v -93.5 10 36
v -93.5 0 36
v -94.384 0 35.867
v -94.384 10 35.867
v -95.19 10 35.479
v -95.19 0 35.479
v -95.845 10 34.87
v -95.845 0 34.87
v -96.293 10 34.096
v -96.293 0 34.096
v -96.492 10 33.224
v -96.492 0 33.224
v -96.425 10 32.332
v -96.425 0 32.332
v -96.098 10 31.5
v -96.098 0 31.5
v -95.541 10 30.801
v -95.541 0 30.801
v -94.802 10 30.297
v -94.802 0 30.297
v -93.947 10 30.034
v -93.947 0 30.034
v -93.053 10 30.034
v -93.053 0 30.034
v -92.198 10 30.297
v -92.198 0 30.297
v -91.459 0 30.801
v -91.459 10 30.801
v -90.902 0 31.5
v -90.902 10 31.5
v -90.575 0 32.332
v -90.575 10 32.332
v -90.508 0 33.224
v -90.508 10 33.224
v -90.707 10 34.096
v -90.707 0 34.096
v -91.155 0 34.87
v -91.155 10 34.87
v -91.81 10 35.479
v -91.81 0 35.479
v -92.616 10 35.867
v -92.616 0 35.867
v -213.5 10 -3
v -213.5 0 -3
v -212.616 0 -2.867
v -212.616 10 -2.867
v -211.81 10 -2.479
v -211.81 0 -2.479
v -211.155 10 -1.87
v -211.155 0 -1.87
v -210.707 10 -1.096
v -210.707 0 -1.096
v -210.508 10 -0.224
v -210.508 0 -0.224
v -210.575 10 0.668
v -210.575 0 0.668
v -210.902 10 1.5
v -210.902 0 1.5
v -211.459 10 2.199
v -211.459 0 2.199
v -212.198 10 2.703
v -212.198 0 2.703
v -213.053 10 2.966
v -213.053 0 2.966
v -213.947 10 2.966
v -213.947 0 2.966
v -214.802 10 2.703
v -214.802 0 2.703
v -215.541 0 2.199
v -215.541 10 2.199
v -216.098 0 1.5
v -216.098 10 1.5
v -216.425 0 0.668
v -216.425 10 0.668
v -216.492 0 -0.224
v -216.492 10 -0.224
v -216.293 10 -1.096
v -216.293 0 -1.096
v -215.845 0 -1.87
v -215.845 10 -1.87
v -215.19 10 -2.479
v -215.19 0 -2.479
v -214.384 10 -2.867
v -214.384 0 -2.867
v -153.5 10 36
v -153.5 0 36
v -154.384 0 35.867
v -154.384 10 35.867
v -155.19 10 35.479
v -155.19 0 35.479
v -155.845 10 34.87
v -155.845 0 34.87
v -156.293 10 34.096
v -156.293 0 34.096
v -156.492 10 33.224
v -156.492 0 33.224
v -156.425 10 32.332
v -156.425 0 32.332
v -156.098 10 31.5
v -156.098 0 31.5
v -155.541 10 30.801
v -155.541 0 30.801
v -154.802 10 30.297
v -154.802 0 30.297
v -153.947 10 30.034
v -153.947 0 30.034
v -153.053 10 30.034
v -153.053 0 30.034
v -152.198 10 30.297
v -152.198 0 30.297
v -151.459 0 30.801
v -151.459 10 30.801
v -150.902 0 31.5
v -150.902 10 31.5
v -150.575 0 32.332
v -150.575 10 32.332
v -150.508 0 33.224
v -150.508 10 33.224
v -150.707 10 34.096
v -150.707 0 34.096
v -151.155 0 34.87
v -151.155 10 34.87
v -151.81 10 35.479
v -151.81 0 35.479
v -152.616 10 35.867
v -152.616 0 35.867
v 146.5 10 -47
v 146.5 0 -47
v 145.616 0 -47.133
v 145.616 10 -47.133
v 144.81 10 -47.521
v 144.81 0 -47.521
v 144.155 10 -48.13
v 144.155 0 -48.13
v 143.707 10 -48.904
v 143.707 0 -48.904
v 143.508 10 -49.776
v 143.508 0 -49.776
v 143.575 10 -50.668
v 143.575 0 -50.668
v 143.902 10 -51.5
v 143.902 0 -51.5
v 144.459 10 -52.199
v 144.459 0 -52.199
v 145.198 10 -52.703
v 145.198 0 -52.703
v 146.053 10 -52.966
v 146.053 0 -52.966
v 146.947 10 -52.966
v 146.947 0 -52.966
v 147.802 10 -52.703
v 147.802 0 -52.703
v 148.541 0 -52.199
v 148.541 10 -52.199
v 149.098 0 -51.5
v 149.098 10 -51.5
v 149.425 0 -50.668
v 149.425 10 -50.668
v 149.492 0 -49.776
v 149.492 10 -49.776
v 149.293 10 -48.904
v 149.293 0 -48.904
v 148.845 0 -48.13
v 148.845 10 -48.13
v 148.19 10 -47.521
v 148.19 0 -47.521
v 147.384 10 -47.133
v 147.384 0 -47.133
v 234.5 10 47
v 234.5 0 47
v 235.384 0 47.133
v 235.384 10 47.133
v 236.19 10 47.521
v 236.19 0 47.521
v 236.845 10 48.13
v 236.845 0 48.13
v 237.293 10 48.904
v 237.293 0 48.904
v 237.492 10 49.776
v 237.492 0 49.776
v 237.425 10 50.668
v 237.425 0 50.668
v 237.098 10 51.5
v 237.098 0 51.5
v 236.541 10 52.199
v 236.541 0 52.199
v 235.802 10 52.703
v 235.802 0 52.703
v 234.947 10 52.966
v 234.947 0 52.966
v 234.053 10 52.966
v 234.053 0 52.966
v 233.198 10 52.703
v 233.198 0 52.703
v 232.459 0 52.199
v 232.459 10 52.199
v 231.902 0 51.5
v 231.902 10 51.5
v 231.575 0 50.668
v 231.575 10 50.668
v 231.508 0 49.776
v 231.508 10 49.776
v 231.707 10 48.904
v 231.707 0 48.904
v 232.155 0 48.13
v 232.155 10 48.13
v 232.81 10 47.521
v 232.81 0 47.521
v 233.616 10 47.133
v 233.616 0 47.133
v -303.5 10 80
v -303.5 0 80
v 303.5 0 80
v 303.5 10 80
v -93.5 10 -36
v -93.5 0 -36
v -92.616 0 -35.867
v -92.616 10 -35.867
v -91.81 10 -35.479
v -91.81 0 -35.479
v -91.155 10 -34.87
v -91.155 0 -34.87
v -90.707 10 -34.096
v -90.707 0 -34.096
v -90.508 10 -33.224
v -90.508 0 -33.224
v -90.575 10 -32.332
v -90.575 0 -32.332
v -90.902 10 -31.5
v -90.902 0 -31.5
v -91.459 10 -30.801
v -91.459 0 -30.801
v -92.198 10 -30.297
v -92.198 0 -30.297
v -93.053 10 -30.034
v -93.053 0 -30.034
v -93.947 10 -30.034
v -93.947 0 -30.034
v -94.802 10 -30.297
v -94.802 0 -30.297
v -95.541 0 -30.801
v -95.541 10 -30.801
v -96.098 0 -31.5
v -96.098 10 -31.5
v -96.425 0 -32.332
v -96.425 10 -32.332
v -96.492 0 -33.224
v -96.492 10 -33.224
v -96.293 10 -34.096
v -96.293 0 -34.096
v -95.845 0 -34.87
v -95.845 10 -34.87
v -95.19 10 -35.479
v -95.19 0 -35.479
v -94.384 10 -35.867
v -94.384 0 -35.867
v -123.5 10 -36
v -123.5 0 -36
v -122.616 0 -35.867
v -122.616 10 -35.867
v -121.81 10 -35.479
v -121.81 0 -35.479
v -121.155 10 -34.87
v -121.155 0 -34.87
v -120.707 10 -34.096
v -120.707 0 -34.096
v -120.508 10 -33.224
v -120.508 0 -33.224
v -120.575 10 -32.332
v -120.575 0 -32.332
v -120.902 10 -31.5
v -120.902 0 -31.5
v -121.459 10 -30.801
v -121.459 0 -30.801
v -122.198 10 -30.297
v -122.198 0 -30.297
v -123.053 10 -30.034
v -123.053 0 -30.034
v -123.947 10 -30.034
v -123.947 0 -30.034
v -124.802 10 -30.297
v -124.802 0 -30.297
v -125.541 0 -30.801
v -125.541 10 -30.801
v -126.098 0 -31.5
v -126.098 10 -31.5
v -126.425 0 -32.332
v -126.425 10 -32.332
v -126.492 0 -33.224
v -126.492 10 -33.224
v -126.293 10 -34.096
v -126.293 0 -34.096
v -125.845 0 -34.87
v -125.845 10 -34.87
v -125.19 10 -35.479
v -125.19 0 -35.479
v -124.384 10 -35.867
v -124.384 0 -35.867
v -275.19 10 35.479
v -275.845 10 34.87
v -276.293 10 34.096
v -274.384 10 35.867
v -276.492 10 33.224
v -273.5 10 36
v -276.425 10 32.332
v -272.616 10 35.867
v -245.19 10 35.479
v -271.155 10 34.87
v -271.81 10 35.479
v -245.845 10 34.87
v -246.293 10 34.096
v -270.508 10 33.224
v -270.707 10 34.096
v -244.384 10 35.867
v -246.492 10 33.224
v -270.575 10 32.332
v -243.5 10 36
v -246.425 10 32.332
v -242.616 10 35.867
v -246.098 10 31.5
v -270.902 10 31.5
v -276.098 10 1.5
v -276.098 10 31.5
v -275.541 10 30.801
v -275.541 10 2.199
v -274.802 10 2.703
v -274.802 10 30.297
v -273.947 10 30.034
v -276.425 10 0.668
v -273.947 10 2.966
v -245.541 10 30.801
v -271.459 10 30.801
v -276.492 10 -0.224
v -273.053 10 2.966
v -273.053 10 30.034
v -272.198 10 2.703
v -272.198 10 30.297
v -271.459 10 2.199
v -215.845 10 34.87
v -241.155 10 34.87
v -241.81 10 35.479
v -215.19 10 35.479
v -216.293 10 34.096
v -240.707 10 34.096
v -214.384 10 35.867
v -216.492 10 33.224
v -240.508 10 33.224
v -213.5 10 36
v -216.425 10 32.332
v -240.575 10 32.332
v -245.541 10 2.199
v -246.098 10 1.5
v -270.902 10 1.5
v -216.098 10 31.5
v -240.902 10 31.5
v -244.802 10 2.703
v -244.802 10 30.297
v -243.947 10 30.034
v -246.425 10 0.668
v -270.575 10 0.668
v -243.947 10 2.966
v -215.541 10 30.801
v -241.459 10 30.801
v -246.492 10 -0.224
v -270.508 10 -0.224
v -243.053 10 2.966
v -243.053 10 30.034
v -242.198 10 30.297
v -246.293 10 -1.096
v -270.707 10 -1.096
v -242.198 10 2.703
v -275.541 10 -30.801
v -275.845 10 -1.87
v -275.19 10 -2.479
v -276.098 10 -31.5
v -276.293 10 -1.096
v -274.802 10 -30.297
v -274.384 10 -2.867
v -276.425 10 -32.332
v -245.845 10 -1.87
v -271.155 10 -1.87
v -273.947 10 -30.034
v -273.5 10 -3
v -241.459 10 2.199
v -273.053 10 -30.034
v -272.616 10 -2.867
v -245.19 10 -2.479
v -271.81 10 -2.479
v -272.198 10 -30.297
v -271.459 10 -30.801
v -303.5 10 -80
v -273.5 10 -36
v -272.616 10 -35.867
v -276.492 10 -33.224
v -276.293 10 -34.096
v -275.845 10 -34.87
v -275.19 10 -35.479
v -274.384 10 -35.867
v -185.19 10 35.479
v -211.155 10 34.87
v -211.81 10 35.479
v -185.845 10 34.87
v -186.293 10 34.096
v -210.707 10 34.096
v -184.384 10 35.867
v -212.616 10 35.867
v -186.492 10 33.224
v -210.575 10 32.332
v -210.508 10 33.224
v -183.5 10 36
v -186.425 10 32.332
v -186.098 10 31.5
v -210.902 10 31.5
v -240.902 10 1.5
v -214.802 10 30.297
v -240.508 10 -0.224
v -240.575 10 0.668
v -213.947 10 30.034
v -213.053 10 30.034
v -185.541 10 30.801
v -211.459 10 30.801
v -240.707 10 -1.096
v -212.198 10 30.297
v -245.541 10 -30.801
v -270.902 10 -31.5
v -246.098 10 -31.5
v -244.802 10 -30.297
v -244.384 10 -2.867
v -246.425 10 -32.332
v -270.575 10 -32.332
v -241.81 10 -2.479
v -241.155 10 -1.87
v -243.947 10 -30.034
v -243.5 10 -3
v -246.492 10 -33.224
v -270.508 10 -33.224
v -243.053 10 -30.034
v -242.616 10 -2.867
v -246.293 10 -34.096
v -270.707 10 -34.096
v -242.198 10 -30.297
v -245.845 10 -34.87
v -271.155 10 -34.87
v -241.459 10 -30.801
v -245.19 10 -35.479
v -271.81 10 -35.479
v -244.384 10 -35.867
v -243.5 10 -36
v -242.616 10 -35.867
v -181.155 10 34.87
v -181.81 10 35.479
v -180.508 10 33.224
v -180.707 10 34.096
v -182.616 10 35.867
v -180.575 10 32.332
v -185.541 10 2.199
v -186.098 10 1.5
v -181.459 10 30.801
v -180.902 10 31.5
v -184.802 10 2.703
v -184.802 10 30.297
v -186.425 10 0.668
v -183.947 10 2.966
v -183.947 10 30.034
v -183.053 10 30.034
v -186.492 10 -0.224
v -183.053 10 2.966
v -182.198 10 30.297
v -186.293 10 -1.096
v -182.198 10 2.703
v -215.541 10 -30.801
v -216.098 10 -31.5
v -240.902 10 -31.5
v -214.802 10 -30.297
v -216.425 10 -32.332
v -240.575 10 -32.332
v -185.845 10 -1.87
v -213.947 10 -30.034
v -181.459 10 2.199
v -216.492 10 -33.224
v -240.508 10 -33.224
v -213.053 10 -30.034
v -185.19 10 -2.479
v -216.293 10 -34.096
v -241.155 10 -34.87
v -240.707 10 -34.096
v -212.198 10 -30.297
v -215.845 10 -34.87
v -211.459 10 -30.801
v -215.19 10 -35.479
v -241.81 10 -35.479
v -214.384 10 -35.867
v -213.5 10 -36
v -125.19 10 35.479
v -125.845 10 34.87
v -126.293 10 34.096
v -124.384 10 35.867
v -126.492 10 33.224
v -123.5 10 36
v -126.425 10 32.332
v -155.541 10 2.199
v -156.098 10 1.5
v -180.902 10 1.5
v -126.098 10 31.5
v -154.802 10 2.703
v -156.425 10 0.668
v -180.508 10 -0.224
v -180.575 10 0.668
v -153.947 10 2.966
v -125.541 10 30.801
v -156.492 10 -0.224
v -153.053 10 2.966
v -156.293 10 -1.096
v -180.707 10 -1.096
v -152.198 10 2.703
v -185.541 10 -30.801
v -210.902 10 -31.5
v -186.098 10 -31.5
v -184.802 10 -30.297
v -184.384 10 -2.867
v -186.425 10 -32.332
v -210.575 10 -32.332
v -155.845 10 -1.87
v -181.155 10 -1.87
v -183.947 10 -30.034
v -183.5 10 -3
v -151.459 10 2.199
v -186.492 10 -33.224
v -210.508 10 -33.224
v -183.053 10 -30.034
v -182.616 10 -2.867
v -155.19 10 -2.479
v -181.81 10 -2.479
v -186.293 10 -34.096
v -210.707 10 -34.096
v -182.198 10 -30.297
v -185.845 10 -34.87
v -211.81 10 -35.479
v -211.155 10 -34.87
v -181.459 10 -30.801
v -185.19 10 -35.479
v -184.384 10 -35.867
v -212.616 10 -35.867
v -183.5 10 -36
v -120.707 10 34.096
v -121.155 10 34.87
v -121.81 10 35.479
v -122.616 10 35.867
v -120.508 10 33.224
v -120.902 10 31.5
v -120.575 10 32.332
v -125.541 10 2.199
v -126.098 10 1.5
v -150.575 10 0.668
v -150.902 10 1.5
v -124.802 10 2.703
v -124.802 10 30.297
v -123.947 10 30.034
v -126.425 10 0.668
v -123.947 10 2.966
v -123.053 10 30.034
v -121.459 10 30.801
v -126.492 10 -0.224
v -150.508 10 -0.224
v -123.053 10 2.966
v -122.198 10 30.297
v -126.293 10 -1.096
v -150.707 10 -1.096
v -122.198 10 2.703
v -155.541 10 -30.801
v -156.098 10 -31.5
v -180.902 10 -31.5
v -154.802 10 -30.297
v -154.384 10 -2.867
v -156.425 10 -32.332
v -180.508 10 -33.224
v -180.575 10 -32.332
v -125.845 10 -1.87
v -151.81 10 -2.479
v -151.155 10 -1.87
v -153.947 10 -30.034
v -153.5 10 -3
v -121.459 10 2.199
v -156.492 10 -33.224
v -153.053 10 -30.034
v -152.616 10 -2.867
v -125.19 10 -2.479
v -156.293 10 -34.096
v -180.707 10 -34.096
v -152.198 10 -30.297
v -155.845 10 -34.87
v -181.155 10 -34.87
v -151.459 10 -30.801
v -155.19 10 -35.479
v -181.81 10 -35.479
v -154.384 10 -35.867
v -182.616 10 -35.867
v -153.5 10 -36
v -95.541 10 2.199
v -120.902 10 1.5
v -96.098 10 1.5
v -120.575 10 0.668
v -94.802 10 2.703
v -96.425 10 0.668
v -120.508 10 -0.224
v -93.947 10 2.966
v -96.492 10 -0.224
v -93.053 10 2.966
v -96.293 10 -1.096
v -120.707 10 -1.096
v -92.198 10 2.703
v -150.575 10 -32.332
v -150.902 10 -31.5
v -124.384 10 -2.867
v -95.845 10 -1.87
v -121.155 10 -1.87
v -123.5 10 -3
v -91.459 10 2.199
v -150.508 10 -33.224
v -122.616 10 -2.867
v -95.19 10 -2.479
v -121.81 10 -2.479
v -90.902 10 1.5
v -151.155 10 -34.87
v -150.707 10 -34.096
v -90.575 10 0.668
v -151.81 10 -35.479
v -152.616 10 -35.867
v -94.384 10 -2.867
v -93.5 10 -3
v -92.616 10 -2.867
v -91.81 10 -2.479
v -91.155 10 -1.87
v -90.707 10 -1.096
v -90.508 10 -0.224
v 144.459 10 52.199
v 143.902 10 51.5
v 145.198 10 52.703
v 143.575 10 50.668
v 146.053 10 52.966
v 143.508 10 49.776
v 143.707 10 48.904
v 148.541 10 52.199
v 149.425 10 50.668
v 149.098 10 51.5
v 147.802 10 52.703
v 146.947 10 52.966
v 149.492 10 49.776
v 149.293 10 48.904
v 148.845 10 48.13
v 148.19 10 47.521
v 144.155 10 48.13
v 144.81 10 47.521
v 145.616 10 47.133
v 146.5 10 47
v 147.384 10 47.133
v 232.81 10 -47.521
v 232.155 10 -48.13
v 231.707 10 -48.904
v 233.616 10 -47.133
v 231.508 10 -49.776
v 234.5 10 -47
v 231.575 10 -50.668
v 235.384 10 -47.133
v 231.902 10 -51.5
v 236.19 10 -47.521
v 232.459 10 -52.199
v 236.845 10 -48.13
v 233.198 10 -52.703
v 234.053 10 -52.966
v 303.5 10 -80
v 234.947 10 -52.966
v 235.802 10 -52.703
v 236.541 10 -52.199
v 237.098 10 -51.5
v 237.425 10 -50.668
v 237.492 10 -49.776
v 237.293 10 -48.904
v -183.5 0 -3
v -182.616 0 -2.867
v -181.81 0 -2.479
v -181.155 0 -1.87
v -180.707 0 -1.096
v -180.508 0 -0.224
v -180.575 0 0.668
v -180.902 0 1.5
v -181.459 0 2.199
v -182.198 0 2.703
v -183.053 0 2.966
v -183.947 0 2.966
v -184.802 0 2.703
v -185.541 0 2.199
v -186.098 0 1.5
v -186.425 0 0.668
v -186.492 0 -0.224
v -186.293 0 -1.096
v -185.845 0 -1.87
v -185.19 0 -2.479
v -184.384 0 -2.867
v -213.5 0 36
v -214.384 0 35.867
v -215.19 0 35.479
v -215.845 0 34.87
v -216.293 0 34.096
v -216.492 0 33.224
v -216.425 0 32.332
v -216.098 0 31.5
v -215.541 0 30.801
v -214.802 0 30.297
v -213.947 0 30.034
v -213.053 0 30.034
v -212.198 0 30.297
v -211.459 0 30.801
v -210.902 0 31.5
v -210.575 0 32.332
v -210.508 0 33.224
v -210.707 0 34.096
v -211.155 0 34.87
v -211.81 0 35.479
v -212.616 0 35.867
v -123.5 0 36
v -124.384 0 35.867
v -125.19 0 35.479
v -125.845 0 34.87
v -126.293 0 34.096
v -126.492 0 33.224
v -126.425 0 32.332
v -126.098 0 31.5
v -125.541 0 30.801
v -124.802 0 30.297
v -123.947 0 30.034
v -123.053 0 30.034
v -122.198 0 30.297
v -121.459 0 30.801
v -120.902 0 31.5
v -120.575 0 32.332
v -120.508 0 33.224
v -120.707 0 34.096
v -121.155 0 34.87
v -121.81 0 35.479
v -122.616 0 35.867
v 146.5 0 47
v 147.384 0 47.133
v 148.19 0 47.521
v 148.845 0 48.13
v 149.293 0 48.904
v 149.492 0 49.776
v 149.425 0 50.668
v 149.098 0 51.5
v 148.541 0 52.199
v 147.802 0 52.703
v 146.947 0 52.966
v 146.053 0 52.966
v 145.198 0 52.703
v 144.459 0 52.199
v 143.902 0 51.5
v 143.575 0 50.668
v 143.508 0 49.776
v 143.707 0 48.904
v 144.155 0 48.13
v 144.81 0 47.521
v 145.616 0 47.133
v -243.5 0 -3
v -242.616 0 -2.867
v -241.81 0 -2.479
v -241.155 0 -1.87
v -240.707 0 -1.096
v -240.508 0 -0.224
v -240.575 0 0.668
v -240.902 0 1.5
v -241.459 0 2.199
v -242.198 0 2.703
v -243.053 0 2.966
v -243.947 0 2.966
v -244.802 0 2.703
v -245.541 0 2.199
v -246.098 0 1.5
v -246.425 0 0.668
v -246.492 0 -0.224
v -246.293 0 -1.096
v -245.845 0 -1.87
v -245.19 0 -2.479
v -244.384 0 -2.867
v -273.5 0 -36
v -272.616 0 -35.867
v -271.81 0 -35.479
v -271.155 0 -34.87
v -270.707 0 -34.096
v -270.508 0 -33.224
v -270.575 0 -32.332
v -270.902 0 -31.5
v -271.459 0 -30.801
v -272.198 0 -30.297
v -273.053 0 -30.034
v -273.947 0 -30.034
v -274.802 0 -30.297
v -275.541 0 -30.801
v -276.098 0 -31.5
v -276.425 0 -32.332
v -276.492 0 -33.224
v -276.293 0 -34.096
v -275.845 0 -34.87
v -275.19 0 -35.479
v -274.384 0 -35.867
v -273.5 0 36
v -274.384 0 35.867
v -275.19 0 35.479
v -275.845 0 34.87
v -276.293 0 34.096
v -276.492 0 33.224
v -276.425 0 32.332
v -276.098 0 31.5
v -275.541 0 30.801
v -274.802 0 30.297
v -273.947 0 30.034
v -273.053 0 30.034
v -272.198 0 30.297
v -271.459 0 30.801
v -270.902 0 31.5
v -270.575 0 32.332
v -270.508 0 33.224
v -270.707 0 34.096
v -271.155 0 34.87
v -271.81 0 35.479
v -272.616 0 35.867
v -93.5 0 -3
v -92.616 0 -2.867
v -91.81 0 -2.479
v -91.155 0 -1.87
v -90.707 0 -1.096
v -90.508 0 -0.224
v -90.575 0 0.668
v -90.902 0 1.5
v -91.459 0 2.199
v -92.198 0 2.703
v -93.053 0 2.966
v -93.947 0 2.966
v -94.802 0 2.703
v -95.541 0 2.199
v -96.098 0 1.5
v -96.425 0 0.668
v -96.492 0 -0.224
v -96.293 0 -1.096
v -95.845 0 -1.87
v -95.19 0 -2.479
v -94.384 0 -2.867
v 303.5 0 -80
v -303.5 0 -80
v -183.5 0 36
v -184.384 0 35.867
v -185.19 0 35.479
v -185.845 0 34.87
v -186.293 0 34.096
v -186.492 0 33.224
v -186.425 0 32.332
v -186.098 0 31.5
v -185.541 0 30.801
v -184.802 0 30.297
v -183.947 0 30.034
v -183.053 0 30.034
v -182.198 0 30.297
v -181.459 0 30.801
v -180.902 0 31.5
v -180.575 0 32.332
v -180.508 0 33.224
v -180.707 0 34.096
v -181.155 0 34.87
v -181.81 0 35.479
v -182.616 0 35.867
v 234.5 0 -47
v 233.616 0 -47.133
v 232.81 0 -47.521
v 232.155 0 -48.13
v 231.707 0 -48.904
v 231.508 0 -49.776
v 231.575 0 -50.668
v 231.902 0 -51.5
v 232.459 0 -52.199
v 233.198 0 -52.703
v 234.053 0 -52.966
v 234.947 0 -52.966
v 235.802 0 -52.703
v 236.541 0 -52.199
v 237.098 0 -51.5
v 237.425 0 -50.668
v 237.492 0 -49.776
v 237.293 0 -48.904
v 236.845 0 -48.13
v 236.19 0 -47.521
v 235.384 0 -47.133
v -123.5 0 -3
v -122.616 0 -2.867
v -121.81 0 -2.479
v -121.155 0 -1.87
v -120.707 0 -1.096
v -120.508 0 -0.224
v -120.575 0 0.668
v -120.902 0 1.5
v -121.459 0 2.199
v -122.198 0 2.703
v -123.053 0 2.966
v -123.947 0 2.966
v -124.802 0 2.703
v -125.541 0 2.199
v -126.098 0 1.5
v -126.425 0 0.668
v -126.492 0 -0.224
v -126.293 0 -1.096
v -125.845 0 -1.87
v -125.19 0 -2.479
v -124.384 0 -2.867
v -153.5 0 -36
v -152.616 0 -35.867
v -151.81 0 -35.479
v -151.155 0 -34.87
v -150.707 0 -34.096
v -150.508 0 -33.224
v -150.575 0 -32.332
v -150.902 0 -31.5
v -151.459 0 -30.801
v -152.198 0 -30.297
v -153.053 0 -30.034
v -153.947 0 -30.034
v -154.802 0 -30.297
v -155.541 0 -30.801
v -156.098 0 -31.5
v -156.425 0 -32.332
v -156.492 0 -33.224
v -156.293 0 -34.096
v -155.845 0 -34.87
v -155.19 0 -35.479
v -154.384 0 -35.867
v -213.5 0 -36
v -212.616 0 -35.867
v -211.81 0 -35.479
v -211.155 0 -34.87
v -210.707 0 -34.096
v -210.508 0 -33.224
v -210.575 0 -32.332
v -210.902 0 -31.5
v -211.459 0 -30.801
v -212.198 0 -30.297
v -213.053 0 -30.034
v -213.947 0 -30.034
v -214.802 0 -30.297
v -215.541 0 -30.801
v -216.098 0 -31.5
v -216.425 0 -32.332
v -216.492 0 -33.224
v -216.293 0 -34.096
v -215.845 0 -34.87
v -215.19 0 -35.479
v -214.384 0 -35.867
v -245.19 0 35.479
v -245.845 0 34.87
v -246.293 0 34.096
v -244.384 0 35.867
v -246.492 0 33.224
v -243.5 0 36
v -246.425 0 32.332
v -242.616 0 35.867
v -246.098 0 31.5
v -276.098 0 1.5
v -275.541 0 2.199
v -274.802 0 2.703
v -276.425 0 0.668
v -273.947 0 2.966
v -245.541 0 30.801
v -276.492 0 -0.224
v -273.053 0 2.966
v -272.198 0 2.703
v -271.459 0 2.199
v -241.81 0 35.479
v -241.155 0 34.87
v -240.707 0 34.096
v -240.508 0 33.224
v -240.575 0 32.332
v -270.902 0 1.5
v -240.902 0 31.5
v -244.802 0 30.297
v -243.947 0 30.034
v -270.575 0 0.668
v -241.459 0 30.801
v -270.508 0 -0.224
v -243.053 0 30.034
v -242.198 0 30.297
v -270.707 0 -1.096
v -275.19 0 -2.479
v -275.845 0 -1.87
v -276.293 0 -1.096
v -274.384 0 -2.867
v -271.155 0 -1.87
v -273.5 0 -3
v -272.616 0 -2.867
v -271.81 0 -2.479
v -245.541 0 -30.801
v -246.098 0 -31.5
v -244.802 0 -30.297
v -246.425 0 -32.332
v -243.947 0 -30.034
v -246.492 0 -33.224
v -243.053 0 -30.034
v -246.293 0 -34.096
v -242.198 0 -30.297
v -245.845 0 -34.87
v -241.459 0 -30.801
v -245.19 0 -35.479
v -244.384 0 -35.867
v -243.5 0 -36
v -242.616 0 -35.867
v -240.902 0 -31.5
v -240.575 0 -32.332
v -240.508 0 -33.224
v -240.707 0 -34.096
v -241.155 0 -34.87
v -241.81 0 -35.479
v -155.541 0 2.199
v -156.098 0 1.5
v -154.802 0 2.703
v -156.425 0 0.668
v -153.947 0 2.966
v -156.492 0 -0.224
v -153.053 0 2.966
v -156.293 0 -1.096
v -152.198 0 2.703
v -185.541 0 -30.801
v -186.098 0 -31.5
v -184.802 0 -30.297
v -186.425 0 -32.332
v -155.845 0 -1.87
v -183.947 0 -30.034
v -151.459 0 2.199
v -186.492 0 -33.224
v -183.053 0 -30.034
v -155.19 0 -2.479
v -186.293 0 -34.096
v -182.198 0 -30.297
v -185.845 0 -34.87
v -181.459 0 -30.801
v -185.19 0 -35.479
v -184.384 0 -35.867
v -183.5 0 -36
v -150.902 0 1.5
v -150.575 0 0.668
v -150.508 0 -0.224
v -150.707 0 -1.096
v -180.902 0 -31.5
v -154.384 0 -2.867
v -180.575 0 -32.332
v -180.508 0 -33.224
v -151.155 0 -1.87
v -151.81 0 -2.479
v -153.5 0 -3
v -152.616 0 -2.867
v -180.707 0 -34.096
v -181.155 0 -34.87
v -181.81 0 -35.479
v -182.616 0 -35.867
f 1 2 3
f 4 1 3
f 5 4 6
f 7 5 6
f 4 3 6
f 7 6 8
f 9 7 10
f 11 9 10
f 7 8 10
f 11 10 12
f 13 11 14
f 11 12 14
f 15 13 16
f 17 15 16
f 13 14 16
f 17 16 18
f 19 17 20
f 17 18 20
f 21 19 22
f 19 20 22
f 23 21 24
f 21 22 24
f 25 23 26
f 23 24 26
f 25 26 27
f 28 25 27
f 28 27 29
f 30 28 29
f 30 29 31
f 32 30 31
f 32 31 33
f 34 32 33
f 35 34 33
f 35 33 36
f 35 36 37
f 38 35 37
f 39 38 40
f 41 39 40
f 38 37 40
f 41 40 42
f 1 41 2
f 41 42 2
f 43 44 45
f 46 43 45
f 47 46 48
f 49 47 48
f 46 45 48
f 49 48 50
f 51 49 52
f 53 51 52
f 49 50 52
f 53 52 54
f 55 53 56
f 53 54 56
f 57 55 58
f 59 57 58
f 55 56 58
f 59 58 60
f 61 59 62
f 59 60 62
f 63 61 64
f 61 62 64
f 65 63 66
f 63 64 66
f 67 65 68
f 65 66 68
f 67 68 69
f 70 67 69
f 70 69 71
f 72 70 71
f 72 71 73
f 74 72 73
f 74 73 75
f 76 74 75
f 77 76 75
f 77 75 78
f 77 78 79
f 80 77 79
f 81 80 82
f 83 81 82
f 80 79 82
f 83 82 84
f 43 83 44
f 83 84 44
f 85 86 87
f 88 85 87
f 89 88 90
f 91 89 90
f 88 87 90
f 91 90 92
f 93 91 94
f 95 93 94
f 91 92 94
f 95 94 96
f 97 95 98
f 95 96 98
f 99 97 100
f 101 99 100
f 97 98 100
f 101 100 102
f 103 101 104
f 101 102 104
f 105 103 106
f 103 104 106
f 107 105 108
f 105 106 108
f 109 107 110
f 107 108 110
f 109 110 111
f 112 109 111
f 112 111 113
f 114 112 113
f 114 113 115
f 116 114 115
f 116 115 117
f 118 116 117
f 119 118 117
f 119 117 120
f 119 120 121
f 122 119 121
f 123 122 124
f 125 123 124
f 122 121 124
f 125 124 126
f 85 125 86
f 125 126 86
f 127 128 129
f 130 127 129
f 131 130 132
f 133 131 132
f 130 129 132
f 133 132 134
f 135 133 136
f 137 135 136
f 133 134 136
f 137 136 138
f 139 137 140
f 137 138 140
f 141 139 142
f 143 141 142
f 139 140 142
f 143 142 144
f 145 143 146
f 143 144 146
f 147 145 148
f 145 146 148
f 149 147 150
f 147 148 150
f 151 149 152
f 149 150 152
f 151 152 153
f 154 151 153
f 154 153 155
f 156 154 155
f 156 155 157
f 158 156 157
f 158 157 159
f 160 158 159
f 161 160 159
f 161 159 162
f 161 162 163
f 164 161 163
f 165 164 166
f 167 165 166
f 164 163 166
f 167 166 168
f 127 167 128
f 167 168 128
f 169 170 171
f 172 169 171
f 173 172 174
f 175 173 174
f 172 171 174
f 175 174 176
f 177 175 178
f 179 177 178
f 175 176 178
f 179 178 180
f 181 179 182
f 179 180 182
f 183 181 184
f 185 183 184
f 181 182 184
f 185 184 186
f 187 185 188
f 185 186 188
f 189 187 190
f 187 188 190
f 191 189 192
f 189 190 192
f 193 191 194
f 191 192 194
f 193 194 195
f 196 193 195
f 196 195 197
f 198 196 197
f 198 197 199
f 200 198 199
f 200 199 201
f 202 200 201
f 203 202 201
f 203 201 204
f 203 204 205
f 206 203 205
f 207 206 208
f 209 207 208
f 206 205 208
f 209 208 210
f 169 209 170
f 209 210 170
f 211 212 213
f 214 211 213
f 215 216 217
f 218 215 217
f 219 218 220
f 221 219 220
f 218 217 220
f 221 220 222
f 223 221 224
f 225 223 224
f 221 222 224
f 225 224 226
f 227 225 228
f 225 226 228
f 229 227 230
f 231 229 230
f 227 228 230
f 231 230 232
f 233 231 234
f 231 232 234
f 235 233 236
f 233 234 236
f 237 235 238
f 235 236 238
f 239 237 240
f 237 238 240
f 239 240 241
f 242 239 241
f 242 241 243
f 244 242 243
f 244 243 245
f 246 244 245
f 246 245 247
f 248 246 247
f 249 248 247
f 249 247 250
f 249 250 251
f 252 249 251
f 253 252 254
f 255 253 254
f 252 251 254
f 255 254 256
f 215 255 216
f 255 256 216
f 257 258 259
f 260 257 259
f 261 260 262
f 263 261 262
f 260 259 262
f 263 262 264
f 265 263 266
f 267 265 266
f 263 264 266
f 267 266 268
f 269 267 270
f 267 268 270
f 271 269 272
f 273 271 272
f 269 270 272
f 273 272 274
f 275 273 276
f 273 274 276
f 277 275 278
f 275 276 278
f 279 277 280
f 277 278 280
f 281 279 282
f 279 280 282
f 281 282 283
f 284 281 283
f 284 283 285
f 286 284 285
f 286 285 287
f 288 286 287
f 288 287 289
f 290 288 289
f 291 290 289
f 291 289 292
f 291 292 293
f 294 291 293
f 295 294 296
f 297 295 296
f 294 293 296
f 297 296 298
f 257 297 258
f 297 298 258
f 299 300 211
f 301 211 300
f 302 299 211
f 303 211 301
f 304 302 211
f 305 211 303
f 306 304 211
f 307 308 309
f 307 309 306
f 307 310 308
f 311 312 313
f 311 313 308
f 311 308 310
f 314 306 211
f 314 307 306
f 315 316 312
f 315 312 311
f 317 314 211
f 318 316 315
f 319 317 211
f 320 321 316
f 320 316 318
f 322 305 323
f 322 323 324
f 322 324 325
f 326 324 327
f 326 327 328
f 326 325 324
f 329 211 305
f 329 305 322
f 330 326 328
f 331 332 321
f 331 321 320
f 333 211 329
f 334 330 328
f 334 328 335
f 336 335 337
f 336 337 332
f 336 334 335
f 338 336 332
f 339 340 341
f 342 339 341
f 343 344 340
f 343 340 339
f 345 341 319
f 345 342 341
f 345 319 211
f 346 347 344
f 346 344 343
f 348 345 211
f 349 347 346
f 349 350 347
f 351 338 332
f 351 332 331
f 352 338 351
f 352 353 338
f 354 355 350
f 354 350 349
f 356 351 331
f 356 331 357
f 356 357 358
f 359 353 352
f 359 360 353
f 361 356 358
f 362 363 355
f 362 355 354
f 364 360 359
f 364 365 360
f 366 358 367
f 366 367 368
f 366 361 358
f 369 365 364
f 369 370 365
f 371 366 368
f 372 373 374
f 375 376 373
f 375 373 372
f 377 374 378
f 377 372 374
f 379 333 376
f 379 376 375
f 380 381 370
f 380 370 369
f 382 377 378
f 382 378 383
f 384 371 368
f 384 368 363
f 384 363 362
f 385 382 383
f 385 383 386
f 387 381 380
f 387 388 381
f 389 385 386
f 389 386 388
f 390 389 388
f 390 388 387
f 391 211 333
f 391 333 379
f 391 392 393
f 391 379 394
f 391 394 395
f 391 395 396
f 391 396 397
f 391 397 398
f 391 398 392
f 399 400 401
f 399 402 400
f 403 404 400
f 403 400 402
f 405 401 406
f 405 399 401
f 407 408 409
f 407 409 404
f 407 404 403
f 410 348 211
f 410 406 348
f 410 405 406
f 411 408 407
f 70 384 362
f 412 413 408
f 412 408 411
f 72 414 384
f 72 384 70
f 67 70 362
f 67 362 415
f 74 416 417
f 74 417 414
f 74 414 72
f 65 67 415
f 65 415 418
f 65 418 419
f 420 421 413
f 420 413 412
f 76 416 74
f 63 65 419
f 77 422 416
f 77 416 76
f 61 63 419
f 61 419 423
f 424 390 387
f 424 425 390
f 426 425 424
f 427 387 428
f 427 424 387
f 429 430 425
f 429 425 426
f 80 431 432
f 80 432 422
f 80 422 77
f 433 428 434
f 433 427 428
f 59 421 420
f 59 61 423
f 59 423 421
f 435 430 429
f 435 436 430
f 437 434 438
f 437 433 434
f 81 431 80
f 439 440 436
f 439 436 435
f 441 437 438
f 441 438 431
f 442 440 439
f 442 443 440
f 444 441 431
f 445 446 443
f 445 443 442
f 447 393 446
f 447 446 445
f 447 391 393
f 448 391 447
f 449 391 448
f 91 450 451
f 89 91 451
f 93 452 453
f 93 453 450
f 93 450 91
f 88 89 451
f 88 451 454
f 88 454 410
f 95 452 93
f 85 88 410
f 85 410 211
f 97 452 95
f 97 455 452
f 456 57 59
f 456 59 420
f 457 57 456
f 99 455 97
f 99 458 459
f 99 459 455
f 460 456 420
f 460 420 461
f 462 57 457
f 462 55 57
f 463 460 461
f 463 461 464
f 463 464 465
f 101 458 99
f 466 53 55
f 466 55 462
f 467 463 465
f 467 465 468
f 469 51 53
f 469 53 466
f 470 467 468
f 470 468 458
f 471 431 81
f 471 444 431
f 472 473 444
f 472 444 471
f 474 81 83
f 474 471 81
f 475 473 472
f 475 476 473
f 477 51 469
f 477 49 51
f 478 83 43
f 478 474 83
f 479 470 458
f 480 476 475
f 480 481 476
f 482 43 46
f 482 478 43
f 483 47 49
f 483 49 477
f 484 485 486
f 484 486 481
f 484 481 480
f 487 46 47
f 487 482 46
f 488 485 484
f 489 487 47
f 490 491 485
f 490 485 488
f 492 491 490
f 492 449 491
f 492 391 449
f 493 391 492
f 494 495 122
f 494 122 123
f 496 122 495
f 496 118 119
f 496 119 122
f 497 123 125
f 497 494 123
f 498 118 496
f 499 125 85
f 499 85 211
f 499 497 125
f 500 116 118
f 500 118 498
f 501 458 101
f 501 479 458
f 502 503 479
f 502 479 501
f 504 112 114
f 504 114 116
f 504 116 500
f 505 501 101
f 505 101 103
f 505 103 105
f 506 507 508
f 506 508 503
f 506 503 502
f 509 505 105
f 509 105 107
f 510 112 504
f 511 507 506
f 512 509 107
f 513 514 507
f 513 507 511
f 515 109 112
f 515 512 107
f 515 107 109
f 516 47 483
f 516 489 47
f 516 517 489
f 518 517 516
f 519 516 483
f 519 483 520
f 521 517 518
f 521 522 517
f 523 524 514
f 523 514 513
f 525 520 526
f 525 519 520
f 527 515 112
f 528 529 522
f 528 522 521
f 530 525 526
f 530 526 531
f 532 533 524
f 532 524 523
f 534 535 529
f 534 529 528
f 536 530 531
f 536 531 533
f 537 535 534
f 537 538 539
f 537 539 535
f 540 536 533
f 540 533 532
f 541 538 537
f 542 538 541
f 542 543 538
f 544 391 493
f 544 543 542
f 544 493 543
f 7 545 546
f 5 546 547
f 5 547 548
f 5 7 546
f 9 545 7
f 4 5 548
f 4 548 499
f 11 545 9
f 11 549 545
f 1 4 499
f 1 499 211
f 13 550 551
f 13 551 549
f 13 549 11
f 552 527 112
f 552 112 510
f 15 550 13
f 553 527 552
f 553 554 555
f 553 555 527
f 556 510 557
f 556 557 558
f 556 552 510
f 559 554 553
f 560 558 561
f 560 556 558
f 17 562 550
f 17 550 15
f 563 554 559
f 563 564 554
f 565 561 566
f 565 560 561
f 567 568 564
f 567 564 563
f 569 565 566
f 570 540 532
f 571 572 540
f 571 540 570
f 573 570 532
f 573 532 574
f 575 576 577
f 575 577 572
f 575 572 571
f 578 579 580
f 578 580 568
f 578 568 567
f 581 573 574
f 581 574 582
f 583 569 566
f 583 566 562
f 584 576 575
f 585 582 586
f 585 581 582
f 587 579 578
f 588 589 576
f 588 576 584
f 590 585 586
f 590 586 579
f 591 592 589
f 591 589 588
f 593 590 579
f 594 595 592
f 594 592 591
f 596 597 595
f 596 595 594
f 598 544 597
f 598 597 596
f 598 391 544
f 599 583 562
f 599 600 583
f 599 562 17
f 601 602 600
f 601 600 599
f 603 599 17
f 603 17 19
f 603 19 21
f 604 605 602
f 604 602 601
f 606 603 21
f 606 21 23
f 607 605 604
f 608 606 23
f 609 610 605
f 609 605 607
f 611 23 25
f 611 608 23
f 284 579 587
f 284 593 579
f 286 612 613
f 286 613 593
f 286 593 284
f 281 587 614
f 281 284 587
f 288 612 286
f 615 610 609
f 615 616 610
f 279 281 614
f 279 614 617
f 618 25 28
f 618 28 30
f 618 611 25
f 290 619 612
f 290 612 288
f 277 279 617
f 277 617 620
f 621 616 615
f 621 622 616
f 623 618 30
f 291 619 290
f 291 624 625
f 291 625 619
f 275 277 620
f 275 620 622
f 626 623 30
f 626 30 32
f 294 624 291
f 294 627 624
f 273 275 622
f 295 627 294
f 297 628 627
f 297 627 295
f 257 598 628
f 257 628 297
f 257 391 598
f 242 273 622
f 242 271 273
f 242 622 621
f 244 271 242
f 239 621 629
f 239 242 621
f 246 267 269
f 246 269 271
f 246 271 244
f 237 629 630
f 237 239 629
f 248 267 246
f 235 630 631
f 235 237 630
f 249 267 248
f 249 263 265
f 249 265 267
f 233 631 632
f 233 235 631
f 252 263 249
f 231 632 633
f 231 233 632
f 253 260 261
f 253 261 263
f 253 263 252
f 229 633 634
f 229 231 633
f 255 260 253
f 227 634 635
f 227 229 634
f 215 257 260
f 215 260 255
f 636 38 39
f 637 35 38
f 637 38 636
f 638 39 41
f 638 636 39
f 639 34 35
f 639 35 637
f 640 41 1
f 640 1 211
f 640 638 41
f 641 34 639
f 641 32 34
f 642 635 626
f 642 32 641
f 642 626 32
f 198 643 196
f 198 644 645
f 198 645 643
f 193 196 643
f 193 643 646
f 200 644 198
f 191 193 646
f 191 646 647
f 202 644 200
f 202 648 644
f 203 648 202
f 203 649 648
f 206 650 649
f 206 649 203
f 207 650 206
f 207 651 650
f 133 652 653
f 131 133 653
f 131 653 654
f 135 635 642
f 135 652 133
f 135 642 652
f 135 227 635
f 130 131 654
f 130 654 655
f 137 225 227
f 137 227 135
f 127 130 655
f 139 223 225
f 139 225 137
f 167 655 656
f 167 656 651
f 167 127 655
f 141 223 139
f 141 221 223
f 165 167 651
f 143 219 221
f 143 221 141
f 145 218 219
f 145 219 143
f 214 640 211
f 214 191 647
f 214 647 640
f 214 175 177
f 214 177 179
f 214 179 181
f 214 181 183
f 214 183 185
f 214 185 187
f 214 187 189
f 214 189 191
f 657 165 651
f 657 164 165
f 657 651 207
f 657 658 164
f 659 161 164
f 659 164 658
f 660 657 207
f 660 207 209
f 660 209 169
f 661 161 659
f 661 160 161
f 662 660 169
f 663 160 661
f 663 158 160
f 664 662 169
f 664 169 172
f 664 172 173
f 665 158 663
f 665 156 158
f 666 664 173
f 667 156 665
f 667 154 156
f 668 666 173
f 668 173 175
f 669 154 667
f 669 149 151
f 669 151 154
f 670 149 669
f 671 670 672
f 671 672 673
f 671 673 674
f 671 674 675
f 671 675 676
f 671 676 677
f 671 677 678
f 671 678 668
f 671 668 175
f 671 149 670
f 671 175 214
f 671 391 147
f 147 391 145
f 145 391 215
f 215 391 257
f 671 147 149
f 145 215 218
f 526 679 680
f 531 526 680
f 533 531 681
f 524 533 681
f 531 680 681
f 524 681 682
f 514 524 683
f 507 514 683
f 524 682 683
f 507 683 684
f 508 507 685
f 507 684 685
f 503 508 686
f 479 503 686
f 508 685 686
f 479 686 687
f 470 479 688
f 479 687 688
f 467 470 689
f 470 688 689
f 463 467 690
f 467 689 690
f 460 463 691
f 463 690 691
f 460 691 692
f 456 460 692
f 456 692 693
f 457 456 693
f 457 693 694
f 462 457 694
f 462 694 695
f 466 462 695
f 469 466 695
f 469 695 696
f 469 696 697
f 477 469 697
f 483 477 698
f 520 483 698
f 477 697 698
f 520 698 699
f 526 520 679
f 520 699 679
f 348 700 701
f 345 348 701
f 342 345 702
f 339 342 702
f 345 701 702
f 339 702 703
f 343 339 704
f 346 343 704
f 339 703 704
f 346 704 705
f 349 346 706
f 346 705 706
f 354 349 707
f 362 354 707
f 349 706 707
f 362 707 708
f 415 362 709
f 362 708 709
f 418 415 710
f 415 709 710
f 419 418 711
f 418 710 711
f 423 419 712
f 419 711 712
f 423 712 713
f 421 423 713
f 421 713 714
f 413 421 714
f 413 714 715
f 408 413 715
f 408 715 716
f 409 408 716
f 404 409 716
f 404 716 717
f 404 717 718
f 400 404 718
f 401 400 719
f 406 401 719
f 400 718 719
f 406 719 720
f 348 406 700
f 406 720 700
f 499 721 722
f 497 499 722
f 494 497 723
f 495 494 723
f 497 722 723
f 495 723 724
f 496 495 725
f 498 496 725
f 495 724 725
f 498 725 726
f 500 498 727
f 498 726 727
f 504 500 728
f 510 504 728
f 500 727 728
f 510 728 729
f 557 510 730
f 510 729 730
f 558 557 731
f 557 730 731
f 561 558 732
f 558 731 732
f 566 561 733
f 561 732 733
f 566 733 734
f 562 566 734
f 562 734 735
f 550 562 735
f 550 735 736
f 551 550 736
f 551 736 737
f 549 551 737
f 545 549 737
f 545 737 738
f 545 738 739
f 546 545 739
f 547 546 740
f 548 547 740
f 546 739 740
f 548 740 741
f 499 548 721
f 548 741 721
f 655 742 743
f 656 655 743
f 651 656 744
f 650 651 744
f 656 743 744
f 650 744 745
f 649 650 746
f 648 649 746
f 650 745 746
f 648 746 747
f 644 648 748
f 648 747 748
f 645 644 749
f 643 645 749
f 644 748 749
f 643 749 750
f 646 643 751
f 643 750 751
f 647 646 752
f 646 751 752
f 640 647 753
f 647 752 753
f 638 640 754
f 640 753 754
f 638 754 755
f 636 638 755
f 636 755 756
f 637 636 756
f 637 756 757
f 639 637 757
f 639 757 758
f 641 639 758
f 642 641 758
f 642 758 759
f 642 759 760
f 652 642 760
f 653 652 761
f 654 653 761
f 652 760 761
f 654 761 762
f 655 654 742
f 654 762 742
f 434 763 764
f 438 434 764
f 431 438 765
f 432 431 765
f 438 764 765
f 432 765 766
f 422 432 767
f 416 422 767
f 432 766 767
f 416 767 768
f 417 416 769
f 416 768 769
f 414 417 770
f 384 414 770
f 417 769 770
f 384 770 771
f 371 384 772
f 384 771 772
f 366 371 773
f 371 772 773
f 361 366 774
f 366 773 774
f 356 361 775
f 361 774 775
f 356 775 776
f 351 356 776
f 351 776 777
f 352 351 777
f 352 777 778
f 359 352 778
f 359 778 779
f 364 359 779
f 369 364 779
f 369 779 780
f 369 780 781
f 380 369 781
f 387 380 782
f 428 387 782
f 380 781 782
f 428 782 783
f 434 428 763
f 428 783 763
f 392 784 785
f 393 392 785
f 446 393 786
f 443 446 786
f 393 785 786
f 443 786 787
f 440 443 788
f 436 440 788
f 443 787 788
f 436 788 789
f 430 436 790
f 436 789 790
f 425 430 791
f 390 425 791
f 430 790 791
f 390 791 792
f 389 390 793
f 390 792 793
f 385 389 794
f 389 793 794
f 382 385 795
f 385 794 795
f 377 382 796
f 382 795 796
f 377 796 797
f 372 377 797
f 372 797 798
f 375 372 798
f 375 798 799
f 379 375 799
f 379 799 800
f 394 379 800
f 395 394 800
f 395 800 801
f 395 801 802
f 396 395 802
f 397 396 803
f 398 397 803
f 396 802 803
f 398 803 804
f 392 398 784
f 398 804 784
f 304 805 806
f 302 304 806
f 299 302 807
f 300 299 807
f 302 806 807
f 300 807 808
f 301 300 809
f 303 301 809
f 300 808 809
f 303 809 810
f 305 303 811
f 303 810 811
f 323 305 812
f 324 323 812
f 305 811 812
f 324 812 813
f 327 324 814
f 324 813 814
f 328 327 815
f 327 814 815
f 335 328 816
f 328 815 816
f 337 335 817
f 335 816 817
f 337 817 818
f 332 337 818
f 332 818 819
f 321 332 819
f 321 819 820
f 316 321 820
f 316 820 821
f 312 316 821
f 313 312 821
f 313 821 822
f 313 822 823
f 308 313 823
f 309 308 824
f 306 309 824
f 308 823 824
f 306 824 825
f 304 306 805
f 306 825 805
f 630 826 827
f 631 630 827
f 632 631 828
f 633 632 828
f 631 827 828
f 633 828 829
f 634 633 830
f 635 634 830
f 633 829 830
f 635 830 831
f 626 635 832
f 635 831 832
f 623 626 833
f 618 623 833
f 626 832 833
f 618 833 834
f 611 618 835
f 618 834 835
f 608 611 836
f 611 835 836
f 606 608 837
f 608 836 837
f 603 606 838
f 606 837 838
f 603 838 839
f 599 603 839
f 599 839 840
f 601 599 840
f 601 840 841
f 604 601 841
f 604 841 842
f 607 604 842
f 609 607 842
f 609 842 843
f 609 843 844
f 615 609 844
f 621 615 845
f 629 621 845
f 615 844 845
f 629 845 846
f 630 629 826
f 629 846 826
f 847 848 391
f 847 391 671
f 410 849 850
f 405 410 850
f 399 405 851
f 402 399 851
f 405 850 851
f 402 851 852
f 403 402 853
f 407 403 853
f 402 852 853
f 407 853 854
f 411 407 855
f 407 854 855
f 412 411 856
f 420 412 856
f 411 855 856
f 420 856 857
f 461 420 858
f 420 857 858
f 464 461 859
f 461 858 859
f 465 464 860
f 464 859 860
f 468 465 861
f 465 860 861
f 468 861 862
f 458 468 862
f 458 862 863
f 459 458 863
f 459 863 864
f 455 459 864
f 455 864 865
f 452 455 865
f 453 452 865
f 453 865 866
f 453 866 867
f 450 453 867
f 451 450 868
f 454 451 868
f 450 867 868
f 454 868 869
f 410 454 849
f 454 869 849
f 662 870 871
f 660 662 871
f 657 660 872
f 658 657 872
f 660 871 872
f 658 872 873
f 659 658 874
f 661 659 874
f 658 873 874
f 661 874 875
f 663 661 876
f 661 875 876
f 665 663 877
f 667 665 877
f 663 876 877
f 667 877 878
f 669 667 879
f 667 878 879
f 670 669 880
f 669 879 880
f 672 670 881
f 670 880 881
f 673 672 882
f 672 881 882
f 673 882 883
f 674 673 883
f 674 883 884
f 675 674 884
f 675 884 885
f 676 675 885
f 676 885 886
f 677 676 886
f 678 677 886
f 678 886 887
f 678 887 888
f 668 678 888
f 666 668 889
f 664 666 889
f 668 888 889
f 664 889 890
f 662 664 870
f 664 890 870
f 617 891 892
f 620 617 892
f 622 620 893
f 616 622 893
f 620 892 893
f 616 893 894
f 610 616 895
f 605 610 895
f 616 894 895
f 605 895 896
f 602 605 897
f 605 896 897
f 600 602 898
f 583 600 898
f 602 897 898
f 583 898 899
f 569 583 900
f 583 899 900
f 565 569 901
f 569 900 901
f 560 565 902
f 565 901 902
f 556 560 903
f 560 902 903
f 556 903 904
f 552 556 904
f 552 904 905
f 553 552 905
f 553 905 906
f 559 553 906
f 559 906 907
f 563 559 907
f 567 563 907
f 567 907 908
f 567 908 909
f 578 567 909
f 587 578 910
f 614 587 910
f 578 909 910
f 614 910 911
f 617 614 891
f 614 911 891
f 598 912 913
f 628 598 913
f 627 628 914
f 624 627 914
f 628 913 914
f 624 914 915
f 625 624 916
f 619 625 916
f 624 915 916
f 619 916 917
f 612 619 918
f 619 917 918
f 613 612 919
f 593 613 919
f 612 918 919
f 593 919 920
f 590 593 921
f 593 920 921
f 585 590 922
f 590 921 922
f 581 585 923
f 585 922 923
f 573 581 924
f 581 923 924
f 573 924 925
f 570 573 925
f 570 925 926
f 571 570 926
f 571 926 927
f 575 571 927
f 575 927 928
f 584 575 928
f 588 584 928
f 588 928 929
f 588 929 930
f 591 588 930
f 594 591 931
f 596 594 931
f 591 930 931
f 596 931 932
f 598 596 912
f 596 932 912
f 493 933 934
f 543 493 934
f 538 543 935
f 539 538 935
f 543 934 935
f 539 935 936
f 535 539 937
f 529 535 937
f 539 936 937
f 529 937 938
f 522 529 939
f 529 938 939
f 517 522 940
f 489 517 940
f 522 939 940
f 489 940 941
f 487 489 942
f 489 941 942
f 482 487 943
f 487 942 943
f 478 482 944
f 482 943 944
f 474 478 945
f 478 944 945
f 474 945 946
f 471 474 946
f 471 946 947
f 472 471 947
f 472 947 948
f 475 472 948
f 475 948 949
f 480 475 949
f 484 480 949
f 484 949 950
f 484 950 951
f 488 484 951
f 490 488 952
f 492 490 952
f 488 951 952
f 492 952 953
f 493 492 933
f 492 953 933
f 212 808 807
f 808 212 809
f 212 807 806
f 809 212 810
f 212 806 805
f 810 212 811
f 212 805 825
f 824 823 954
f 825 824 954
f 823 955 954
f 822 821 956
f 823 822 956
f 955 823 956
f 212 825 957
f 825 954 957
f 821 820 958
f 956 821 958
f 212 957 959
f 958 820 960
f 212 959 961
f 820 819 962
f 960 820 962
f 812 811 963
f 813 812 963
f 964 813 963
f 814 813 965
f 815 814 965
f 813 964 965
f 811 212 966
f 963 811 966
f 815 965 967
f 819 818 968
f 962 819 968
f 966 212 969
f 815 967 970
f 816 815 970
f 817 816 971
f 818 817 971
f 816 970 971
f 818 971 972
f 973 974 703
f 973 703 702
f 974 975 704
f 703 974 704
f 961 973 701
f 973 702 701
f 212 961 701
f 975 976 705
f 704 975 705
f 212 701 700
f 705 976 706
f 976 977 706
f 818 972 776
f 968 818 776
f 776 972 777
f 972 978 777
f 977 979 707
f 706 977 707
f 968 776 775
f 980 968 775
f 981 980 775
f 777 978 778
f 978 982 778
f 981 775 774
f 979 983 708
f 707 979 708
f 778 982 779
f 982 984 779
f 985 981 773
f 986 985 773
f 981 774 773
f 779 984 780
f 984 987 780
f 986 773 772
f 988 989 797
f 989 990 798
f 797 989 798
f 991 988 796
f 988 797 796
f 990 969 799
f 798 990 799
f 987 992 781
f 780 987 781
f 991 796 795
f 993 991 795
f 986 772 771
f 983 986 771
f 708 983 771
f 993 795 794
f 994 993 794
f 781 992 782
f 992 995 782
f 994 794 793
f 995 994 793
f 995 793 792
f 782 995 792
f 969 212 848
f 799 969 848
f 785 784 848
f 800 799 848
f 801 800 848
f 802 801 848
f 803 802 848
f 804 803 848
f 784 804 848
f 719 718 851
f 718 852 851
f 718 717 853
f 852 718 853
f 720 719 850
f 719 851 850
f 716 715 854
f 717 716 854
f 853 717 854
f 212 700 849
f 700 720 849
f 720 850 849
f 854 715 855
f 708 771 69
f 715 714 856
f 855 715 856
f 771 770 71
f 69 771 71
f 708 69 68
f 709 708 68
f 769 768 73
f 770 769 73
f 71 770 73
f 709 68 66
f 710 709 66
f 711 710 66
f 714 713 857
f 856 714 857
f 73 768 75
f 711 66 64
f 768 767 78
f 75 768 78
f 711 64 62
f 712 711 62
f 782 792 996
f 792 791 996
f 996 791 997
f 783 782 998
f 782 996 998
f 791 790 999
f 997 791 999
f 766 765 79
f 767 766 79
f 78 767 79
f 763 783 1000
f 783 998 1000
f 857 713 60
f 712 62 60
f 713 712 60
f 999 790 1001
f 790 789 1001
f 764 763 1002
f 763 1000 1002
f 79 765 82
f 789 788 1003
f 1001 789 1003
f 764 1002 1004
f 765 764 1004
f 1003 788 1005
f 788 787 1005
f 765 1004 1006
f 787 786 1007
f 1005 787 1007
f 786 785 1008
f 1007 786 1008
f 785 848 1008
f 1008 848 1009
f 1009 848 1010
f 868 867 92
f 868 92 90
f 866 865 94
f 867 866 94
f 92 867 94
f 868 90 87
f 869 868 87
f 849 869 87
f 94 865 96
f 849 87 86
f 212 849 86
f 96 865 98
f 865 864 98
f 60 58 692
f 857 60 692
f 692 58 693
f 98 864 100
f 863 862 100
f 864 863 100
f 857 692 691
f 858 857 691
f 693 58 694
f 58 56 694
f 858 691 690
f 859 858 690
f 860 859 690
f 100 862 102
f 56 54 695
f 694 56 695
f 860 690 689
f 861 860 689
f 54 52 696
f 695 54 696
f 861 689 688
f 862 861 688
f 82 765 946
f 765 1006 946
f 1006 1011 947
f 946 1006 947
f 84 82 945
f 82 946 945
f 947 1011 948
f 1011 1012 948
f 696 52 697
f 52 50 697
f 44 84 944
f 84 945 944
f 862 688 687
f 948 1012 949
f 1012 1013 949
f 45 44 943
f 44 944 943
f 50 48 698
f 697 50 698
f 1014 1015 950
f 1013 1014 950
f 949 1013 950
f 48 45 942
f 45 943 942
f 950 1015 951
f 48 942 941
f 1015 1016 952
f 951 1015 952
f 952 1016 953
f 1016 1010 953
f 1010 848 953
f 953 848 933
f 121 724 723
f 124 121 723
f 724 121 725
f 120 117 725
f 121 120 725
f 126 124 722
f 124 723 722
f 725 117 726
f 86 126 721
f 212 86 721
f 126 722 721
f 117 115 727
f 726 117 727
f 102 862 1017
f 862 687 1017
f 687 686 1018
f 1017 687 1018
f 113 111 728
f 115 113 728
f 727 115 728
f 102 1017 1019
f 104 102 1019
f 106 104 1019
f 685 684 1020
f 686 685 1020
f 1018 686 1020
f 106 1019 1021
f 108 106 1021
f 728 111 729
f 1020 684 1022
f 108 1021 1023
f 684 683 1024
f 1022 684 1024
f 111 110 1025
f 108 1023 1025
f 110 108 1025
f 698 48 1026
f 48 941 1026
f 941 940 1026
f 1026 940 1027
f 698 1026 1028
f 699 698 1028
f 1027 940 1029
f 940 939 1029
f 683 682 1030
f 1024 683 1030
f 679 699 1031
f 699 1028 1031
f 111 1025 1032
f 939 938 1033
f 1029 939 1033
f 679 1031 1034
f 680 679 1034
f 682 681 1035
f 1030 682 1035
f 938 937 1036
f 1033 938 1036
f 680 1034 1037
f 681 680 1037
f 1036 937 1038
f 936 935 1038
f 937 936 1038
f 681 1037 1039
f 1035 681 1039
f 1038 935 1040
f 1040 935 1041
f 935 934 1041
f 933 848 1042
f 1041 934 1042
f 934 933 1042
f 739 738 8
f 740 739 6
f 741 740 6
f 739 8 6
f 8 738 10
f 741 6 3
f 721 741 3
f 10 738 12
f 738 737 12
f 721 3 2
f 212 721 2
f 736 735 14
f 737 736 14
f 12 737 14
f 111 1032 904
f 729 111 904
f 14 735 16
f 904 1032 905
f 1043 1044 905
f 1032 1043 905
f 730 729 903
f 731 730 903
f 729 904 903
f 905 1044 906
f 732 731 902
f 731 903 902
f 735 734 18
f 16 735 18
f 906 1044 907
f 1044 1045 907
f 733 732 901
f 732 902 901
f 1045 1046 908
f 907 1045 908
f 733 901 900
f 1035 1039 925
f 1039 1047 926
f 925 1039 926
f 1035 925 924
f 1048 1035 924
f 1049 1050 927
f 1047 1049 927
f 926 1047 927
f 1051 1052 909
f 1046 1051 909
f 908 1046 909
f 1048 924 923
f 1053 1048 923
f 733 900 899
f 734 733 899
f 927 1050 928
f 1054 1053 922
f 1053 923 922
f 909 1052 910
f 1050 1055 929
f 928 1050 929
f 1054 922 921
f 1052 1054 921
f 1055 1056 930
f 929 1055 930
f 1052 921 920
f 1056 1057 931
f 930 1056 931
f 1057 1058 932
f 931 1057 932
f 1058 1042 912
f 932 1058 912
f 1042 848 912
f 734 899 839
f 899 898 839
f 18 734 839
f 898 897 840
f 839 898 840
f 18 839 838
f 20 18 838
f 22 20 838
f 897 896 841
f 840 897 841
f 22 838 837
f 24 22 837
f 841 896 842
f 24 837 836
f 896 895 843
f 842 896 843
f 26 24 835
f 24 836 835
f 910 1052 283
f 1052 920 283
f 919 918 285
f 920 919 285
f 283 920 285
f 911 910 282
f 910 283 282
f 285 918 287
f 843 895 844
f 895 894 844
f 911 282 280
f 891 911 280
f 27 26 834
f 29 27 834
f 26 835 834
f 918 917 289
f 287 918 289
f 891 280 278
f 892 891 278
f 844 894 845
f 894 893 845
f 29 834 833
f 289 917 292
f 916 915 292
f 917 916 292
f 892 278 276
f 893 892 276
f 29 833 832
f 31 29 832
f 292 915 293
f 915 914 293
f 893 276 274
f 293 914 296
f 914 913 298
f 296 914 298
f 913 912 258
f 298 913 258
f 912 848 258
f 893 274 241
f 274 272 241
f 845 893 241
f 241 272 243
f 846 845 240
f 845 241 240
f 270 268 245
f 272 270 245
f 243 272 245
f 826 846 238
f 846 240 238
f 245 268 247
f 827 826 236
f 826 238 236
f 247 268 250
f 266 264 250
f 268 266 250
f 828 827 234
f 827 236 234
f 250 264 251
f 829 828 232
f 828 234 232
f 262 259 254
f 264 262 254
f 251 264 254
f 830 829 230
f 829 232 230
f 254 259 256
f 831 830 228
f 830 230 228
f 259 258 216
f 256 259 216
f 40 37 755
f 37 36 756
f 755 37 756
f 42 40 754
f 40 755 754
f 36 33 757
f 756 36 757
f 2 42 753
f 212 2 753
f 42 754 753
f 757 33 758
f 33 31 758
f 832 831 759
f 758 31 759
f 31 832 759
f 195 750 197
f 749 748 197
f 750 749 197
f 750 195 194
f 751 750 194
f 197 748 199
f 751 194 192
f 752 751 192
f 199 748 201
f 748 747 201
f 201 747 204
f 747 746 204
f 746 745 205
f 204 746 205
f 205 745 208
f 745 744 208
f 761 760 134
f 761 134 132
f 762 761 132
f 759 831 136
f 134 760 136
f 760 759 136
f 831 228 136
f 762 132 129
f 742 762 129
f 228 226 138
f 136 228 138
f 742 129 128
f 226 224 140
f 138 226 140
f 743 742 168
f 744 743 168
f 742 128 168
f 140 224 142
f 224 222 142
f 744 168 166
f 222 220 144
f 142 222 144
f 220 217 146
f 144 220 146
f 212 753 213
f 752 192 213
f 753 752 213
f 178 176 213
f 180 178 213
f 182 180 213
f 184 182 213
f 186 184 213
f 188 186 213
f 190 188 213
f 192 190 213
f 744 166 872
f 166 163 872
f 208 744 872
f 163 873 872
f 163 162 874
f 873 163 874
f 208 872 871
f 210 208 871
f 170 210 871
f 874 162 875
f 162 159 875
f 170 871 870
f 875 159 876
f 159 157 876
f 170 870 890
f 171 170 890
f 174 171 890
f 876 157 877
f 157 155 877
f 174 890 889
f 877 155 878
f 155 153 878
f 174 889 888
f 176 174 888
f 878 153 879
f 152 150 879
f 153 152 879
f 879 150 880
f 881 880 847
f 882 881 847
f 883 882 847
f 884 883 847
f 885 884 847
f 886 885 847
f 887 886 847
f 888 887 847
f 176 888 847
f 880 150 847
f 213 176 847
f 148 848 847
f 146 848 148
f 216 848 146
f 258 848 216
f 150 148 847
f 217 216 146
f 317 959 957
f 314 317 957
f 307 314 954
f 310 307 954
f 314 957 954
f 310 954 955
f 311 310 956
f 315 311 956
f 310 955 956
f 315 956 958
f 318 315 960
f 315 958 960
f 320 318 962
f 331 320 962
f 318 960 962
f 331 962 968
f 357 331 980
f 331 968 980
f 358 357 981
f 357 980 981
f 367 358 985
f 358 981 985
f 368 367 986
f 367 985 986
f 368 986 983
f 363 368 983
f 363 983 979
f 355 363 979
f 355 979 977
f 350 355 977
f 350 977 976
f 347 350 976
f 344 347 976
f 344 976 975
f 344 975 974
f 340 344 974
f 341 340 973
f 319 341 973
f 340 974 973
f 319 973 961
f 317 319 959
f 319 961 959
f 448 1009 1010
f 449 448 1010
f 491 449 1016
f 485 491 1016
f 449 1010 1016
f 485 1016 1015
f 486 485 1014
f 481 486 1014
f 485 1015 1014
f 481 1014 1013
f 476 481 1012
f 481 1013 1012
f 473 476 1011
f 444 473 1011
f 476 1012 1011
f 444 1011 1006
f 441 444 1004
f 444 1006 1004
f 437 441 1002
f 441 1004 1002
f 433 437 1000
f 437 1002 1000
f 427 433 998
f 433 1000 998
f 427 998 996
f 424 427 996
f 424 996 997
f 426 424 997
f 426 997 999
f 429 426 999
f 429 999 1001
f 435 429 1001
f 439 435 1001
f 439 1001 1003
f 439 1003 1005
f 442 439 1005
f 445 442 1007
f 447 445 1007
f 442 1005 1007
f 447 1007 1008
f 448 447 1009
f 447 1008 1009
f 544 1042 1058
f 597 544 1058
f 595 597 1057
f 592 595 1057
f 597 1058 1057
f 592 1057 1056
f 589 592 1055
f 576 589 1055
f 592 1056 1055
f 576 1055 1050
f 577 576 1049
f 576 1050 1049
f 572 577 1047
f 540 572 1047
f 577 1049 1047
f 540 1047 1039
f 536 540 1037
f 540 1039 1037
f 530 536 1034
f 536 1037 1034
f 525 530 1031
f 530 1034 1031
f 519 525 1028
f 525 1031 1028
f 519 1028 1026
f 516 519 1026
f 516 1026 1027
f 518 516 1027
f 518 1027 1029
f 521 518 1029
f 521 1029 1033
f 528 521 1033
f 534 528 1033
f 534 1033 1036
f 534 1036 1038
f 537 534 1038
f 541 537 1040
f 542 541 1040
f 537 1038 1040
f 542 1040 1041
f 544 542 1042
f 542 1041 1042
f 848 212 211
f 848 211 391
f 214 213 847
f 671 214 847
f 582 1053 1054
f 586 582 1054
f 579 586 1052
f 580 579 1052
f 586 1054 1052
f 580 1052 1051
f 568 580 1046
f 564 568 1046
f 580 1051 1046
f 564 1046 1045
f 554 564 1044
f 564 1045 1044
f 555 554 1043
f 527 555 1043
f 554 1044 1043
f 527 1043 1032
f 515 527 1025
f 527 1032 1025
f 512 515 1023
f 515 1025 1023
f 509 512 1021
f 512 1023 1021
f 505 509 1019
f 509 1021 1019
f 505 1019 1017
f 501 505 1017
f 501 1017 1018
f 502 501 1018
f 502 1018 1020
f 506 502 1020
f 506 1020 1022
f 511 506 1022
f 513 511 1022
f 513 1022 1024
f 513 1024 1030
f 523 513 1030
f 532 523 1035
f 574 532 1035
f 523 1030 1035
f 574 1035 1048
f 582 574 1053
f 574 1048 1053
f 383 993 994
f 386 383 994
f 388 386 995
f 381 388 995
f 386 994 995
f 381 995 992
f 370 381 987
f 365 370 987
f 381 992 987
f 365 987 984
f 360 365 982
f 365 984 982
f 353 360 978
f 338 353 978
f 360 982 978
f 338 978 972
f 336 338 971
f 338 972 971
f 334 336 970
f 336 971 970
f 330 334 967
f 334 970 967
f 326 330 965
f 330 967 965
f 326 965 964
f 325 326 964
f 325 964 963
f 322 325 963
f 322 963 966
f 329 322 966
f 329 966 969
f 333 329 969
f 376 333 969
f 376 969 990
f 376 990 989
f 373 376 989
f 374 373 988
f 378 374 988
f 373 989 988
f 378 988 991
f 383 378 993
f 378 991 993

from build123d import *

# Parameters (mm, degrees)
SKETCH1_W           = 607
SKETCH1_H           = 160
BOSS_EXTRUDE1_DEPTH = 10
SKETCH2_R           = 3
CUT_EXTRUDE1_DEPTH  = 10


with BuildPart() as part:
    # Sketch1 → Boss-Extrude1 (new body)
    with BuildSketch(Plane(origin=(0, 0, 0), x_dir=(1, 0, 0), z_dir=(0, 1, 0))):
        Rectangle(SKETCH1_W, SKETCH1_H)
    extrude(amount=BOSS_EXTRUDE1_DEPTH)

    # Sketch2 → Cut-Extrude1 (cut)
    with BuildSketch(Plane.XZ):
        with Locations(Location((-93.5, -33, 0), (0, 0, 270))):
            Circle(SKETCH2_R)
        with Locations(Location((-123.5, -33, 0), (0, 0, 270))):
            Circle(SKETCH2_R)
        with Locations(Location((-153.5, -33, 0), (0, 0, 270))):
            Circle(SKETCH2_R)
        with Locations(Location((-183.5, -33, 0), (0, 0, 270))):
            Circle(SKETCH2_R)
        with Locations(Location((-183.5, 0, 0), (0, 0, 270))):
            Circle(SKETCH2_R)
        with Locations(Location((-183.5, 33, 0), (0, 0, 90))):
            Circle(SKETCH2_R)
        with Locations(Location((-213.5, 33, 0), (0, 0, 90))):
            Circle(SKETCH2_R)
        with Locations(Location((-153.5, 0, 0), (0, 0, 270))):
            Circle(SKETCH2_R)
        with Locations(Location((-213.5, -33, 0), (0, 0, 270))):
            Circle(SKETCH2_R)
        with Locations(Location((-153.5, 33, 0), (0, 0, 90))):
            Circle(SKETCH2_R)
        with Locations(Location((-123.5, 0, 0), (0, 0, 270))):
            Circle(SKETCH2_R)
        with Locations(Location((-123.5, 33, 0), (0, 0, 90))):
            Circle(SKETCH2_R)
        with Locations(Location((-93.5, 0, 0), (0, 0, 270))):
            Circle(SKETCH2_R)
        with Locations(Location((-93.5, 33, 0), (0, 0, 90))):
            Circle(SKETCH2_R)
        with Locations(Location((234.5, 50, 0), (0, 0, 270))):
            Circle(SKETCH2_R)
        with Locations(Location((146.5, 50, 0), (0, 0, 270))):
            Circle(SKETCH2_R)
        with Locations(Location((146.5, -50, 0), (0, 0, 90))):
            Circle(SKETCH2_R)
        with Locations(Location((234.5, -50, 0), (0, 0, 90))):
            Circle(SKETCH2_R)
        with Locations(Location((-243.5, 33, 0), (0, 0, 90))):
            Circle(SKETCH2_R)
        with Locations(Location((-243.5, 0, 0), (0, 0, 270))):
            Circle(SKETCH2_R)
        with Locations(Location((-213.5, 0, 0), (0, 0, 270))):
            Circle(SKETCH2_R)
        with Locations(Location((-243.5, -33, 0), (0, 0, 270))):
            Circle(SKETCH2_R)
        with Locations(Location((-273.5, 33, 0), (0, 0, 90))):
            Circle(SKETCH2_R)
        with Locations(Location((-273.5, 0, 0), (0, 0, 270))):
            Circle(SKETCH2_R)
        with Locations(Location((-273.5, -33, 0), (0, 0, 270))):
            Circle(SKETCH2_R)
    extrude(amount=-CUT_EXTRUDE1_DEPTH, mode=Mode.SUBTRACT)


solid = part.part
